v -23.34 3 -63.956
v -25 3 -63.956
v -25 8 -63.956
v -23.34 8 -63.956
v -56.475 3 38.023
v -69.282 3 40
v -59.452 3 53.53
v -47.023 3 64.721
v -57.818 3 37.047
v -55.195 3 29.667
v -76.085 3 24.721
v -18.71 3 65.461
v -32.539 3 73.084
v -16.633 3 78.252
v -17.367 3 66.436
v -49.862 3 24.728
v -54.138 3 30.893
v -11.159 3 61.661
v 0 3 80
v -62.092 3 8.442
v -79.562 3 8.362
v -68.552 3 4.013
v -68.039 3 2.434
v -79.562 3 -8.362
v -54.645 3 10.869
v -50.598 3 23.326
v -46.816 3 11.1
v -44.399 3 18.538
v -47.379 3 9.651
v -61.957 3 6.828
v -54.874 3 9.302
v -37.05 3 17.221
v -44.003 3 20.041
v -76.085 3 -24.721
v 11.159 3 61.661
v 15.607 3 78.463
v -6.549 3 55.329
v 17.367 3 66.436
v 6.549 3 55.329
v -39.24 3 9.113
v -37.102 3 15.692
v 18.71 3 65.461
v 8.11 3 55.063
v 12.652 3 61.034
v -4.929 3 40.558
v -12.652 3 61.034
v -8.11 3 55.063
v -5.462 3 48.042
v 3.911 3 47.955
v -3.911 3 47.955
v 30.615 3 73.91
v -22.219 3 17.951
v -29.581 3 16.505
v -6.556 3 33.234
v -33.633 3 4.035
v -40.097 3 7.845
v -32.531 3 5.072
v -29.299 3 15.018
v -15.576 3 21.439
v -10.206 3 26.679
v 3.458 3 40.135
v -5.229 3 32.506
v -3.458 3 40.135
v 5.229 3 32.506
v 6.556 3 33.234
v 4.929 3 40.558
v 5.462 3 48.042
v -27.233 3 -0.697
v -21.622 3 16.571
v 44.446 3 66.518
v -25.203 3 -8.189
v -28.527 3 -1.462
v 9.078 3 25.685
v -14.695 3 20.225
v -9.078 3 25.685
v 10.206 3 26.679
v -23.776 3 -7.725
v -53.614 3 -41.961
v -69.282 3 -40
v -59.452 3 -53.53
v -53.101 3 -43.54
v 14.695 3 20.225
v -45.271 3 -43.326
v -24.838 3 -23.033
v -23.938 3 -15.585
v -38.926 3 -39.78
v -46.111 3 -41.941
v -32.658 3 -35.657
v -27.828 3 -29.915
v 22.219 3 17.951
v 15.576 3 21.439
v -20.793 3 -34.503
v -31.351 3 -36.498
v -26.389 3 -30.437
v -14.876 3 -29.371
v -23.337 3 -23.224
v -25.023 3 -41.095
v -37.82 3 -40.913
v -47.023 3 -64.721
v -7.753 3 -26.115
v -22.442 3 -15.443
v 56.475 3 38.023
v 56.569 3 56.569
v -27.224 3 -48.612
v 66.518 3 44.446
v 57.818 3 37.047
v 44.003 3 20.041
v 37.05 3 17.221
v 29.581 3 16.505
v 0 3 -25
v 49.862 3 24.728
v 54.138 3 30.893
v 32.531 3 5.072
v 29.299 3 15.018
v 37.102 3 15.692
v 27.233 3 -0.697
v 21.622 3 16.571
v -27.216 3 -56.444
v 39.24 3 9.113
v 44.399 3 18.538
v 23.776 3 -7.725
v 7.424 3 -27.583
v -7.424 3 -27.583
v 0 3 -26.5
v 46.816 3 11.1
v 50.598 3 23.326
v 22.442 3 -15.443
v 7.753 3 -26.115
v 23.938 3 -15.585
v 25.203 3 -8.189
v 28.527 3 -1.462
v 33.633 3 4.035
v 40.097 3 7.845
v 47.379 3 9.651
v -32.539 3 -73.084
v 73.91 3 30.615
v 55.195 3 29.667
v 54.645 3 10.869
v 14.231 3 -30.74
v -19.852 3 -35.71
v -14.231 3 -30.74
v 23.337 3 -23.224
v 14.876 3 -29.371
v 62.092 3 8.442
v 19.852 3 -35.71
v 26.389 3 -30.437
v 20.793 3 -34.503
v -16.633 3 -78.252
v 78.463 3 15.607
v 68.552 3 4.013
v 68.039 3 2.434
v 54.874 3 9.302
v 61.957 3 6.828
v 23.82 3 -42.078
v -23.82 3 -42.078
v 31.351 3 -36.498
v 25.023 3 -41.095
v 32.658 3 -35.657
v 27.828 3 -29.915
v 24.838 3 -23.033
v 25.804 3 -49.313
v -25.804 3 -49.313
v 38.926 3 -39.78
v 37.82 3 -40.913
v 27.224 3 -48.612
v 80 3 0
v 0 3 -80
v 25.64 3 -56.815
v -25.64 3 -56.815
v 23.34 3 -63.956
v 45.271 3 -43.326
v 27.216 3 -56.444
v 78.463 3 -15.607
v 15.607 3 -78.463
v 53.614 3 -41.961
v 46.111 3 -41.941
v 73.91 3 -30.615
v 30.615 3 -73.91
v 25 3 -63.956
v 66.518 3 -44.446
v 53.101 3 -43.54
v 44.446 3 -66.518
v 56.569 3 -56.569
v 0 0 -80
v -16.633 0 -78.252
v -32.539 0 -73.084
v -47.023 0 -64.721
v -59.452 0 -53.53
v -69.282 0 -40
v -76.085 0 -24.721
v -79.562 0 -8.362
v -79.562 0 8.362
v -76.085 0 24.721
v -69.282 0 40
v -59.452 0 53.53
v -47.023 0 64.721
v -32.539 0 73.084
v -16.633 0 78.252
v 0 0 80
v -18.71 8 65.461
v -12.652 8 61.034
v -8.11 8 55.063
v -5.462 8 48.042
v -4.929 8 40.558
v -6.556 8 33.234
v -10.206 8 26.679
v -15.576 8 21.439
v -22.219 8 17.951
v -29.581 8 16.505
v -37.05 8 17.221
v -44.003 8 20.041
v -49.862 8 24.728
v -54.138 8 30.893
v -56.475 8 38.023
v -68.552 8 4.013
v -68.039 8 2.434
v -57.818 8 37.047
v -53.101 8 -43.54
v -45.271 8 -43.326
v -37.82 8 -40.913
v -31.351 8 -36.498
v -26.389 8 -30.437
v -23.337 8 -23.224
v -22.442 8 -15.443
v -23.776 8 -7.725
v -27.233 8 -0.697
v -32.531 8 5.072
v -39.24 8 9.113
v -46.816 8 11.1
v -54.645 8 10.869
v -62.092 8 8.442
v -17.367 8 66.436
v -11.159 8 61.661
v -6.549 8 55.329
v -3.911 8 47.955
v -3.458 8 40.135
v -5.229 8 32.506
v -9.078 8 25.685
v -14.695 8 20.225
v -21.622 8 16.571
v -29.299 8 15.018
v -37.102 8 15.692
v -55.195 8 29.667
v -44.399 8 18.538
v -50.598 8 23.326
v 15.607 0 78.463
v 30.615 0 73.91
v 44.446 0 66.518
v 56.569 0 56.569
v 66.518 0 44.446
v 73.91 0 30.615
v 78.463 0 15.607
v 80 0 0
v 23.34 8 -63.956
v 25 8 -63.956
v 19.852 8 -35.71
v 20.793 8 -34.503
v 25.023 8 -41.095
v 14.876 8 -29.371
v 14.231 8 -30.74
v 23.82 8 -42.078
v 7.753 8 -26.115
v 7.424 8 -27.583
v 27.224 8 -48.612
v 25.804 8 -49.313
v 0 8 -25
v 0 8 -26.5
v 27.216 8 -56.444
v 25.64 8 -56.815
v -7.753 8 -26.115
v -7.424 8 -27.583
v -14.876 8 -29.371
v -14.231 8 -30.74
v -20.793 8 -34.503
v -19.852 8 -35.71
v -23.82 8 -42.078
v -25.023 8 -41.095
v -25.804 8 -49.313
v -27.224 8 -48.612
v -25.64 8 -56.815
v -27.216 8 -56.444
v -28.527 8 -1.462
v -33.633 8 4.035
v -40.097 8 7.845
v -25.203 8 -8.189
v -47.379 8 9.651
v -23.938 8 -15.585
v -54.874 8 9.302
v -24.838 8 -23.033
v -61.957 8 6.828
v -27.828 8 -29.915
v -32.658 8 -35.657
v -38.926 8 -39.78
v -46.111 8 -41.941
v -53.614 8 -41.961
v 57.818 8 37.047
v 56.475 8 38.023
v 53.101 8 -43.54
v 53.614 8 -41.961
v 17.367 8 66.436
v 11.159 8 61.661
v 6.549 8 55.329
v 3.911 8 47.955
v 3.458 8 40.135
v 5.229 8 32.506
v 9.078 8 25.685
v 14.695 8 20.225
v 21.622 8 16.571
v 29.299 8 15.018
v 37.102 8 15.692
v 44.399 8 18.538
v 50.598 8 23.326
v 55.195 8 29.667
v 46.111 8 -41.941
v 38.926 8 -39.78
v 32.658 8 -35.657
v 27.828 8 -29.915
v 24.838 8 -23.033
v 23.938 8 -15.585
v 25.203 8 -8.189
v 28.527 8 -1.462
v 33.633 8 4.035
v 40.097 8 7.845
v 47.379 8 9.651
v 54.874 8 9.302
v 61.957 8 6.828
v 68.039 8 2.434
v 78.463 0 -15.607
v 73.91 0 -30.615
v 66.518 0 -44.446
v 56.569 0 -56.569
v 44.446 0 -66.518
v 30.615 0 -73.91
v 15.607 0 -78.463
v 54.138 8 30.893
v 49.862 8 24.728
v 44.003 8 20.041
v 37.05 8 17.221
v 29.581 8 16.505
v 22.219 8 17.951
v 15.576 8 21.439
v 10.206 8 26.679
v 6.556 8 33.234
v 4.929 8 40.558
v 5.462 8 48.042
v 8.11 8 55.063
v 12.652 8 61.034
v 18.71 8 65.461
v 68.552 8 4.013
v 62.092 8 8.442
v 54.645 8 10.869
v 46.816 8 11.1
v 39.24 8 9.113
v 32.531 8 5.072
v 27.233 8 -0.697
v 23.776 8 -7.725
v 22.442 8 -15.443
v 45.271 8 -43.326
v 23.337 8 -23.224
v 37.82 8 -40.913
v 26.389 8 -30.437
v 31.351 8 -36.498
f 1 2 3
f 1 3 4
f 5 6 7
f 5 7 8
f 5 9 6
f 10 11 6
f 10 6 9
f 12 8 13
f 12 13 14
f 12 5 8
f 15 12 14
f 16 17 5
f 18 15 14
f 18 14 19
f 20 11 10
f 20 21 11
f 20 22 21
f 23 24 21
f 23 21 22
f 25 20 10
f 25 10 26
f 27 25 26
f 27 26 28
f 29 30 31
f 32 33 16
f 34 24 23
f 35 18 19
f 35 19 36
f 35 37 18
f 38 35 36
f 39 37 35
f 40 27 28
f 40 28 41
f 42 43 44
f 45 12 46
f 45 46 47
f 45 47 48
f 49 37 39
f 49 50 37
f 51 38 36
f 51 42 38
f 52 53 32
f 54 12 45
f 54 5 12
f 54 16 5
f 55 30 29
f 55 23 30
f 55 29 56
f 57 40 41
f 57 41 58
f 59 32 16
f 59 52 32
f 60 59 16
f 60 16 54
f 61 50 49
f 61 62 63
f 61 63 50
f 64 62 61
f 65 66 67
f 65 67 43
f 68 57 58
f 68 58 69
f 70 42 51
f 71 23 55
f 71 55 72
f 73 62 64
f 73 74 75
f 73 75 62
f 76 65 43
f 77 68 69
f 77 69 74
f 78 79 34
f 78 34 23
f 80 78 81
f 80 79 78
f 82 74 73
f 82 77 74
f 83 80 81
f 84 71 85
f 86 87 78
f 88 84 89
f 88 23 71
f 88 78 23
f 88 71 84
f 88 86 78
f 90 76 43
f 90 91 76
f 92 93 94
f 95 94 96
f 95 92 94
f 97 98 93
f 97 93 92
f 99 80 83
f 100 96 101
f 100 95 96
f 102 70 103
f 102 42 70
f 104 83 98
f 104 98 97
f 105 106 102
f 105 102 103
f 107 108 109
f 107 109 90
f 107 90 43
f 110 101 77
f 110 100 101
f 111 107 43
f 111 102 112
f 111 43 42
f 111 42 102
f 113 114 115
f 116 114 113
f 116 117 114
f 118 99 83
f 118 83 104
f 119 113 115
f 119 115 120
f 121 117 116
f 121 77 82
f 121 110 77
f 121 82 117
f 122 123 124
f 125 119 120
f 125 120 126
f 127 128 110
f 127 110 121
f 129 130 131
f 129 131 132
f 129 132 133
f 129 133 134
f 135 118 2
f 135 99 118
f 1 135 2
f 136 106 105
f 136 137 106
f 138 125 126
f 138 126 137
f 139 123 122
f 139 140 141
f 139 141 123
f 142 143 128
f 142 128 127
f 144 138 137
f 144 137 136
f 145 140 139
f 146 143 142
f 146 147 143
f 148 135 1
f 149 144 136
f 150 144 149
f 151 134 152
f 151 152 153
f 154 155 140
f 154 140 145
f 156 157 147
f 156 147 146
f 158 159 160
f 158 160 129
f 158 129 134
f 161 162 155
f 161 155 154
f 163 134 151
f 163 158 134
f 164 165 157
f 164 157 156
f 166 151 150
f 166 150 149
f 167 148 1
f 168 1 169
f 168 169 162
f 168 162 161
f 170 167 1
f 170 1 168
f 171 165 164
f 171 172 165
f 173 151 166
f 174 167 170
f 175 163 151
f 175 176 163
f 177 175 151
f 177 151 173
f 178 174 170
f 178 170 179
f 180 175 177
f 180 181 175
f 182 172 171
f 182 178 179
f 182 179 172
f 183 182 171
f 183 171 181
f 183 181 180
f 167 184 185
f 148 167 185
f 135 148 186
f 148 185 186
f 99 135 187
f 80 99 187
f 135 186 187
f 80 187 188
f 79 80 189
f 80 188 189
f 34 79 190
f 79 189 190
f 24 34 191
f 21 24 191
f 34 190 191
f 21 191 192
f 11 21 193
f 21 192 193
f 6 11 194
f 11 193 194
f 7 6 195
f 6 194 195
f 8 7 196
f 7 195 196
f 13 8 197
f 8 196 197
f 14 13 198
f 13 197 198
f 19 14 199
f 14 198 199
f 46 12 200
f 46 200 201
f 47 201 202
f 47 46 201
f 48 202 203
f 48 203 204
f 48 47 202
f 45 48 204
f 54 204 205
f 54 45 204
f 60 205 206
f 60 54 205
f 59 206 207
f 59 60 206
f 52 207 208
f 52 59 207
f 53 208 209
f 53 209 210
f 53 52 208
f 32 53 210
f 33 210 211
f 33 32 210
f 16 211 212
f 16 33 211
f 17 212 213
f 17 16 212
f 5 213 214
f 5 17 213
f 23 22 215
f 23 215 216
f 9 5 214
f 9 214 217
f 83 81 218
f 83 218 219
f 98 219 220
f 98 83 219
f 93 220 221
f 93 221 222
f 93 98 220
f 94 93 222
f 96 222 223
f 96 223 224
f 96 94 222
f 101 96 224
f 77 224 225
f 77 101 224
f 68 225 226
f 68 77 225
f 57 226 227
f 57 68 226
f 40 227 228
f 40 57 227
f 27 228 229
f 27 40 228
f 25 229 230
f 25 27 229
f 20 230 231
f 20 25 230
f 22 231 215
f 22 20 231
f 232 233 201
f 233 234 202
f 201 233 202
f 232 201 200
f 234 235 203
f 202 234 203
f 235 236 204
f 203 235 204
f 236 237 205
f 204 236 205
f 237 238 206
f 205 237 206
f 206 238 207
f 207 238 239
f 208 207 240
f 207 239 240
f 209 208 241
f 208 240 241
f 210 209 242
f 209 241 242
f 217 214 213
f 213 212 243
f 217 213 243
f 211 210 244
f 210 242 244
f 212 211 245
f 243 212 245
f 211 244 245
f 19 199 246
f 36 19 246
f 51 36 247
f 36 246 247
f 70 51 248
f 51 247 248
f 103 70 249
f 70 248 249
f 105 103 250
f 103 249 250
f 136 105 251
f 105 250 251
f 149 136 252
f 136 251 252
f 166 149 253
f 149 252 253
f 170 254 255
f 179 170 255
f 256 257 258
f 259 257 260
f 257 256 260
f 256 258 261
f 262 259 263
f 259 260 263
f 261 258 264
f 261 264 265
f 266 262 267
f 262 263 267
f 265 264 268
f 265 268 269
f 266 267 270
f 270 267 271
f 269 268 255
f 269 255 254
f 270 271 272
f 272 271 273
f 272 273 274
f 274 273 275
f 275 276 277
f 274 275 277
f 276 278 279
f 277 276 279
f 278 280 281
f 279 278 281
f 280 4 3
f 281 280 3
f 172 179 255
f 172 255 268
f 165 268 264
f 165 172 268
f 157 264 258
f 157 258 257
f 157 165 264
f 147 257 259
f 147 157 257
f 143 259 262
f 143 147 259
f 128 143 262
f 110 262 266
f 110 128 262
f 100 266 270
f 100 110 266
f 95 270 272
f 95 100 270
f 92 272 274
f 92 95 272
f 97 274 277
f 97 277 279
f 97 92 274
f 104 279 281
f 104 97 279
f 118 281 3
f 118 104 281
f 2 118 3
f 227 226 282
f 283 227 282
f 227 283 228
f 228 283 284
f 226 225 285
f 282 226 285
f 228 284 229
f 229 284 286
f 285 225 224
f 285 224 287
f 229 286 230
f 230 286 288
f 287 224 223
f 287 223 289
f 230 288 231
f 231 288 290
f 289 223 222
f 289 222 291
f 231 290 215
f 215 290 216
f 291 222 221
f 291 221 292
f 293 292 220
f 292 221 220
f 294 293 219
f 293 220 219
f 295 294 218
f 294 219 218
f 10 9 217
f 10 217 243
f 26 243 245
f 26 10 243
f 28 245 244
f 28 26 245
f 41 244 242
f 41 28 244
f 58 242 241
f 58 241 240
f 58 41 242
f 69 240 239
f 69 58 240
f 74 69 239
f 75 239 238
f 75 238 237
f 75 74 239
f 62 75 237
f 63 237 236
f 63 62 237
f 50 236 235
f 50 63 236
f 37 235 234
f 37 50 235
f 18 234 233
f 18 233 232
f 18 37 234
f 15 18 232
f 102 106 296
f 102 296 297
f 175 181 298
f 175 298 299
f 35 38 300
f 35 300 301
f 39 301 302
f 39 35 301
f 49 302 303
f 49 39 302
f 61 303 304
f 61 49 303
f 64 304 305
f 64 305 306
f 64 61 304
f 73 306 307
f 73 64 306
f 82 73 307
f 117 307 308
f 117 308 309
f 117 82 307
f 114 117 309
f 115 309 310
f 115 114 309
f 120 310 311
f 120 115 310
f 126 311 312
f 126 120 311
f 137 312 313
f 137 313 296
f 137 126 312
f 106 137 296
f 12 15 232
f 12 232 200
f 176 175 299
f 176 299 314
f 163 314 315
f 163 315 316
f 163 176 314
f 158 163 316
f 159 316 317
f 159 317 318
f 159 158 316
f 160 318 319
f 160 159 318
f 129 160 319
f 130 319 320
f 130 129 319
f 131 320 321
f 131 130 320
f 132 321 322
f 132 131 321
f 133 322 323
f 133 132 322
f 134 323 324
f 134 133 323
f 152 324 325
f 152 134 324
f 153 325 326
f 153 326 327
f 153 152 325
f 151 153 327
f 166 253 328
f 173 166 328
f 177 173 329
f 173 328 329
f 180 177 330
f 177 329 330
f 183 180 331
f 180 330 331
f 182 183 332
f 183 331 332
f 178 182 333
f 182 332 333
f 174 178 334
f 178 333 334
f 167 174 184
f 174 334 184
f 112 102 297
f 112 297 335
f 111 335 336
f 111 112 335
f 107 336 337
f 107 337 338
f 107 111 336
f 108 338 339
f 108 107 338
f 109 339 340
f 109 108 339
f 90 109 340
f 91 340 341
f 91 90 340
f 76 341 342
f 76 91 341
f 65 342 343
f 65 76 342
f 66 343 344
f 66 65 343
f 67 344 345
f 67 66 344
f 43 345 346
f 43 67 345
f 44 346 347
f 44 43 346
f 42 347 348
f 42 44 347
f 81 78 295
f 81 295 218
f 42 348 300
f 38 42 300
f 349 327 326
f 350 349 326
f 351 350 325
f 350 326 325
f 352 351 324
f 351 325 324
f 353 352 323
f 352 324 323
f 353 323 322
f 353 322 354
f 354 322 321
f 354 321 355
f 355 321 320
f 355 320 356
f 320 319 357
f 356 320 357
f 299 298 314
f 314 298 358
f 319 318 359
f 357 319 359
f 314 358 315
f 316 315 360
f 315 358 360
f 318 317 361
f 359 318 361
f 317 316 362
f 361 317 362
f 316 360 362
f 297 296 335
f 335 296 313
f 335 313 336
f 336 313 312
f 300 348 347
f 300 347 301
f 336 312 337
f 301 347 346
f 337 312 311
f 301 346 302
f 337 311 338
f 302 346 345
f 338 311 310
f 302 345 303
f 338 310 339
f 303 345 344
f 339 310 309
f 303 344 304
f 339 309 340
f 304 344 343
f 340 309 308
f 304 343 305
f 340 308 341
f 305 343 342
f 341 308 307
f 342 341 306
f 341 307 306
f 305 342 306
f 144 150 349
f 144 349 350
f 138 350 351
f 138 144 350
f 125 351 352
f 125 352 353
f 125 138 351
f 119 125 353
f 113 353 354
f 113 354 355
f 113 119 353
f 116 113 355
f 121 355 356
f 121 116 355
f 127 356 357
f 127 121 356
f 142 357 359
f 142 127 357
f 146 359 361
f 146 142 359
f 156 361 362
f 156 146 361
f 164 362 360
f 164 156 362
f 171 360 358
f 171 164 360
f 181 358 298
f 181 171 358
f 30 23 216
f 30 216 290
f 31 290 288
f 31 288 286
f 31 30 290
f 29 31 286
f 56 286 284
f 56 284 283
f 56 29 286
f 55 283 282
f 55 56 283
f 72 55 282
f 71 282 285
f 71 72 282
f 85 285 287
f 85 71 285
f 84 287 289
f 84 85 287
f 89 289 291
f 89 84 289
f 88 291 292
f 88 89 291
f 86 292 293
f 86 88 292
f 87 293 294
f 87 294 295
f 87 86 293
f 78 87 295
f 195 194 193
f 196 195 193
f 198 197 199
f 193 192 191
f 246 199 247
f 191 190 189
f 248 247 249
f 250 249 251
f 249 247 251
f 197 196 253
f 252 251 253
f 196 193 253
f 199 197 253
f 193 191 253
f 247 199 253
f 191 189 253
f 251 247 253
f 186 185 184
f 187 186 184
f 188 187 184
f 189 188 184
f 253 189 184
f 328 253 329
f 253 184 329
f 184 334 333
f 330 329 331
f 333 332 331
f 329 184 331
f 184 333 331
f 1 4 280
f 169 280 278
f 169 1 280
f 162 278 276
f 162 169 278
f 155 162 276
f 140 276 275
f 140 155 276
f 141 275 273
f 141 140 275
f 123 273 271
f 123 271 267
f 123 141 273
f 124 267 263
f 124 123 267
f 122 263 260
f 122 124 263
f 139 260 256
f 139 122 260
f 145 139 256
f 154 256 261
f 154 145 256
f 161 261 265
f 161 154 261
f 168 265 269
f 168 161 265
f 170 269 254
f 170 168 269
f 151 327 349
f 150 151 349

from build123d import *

# Parameters (mm, degrees)
SKETCH_1_R      = 80
EXTRUDE_1_DEPTH = 3
EXTRUDE_2_DEPTH = 8


with BuildPart() as part:
    # 草图1 → 凸台-拉伸1 (new body)
    with BuildSketch(Plane(origin=(0, 0, 0), x_dir=(1, 0, 0), z_dir=(0, 1, 0))):
        Circle(SKETCH_1_R)
        with BuildLine():
            ThreePointArc((-23.339880034, 63.956439237), (0, 26.5), (23.339880034, 63.956439237))
            Line((23.339880034, 63.956439237), (25, 63.956439237))
            ThreePointArc((25, 63.956439237), (0, 25), (-25, 63.956439237))
            Line((-25, 63.956439237), (-23.339880034, 63.956439237))
        make_face(mode=Mode.SUBTRACT)
        with BuildLine():
            ThreePointArc((-18.710292179, -65.460683517), (-15.576309186, -21.438950351), (-56.475011367, -38.023008969))
            Line((-56.475011367, -38.023008969), (-57.818076632, -37.047214935))
            ThreePointArc((-57.818076632, -37.047214935), (-14.694631307, -20.225424859), (-17.367226914, -66.43647755))
            Line((-17.367226914, -66.43647755), (-18.710292179, -65.460683517))
        make_face(mode=Mode.SUBTRACT)
        with BuildLine():
            ThreePointArc((-68.038607873, -2.433918372), (-25.202997682, 8.188950351), (-53.613768719, 41.96117162))
            Line((-53.613768719, 41.96117162), (-53.100763436, 43.540039531))
            ThreePointArc((-53.100763436, 43.540039531), (-23.776412907, 7.725424859), (-68.551613155, -4.012786283))
            Line((-68.551613155, -4.012786283), (-68.038607873, -2.433918372))
        make_face(mode=Mode.SUBTRACT)
        with BuildLine():
            ThreePointArc((68.551613155, -4.012786283), (23.776412907, 7.725424859), (53.100763436, 43.540039531))
            Line((53.100763436, 43.540039531), (53.613768719, 41.96117162))
            ThreePointArc((53.613768719, 41.96117162), (25.202997682, 8.188950351), (68.038607873, -2.433918372))
            Line((68.038607873, -2.433918372), (68.551613155, -4.012786283))
        make_face(mode=Mode.SUBTRACT)
        with BuildLine():
            ThreePointArc((56.475011367, -38.023008969), (15.576309186, -21.438950351), (18.710292179, -65.460683517))
            Line((18.710292179, -65.460683517), (17.367226914, -66.43647755))
            ThreePointArc((17.367226914, -66.43647755), (14.694631307, -20.225424859), (57.818076632, -37.047214935))
            Line((57.818076632, -37.047214935), (56.475011367, -38.023008969))
        make_face(mode=Mode.SUBTRACT)
    extrude(amount=EXTRUDE_1_DEPTH)

    # 草图1<5> → 凸台-拉伸2 (add)
    with BuildSketch(Plane(origin=(0, 0, 0), x_dir=(1, 0, 0), z_dir=(0, 1, 0))):
        with BuildLine():
            Line((-25, 63.956439237), (-23.339880034, 63.956439237))
            ThreePointArc((-23.339880034, 63.956439237), (0, 26.5), (23.339880034, 63.956439237))
            Line((23.339880034, 63.956439237), (25, 63.956439237))
            ThreePointArc((25, 63.956439237), (0, 25), (-25, 63.956439237))
        make_face()
        with BuildLine():
            Line((68.038607873, -2.433918372), (68.551613155, -4.012786283))
            ThreePointArc((68.551613155, -4.012786283), (23.776412907, 7.725424859), (53.100763436, 43.540039531))
            Line((53.100763436, 43.540039531), (53.613768719, 41.96117162))
            ThreePointArc((53.613768719, 41.96117162), (25.202997682, 8.188950351), (68.038607873, -2.433918372))
        make_face()
        with BuildLine():
            Line((18.710292179, -65.460683517), (17.367226914, -66.43647755))
            ThreePointArc((17.367226914, -66.43647755), (14.694631307, -20.225424859), (57.818076632, -37.047214935))
            Line((57.818076632, -37.047214935), (56.475011367, -38.023008969))
            ThreePointArc((56.475011367, -38.023008969), (15.576309186, -21.438950351), (18.710292179, -65.460683517))
        make_face()
        with BuildLine():
            Line((-56.475011367, -38.023008969), (-57.818076632, -37.047214935))
            ThreePointArc((-57.818076632, -37.047214935), (-14.694631307, -20.225424859), (-17.367226914, -66.43647755))
            Line((-17.367226914, -66.43647755), (-18.710292179, -65.460683517))
            ThreePointArc((-18.710292179, -65.460683517), (-15.576309186, -21.438950351), (-56.475011367, -38.023008969))
        make_face()
        with BuildLine():
            Line((-53.613768719, 41.96117162), (-53.100763436, 43.540039531))
            ThreePointArc((-53.100763436, 43.540039531), (-23.776412907, 7.725424859), (-68.551613155, -4.012786283))
            Line((-68.551613155, -4.012786283), (-68.038607873, -2.433918372))
            ThreePointArc((-68.038607873, -2.433918372), (-25.202997682, 8.188950351), (-53.613768719, 41.96117162))
        make_face()
    extrude(amount=EXTRUDE_2_DEPTH)


solid = part.part
